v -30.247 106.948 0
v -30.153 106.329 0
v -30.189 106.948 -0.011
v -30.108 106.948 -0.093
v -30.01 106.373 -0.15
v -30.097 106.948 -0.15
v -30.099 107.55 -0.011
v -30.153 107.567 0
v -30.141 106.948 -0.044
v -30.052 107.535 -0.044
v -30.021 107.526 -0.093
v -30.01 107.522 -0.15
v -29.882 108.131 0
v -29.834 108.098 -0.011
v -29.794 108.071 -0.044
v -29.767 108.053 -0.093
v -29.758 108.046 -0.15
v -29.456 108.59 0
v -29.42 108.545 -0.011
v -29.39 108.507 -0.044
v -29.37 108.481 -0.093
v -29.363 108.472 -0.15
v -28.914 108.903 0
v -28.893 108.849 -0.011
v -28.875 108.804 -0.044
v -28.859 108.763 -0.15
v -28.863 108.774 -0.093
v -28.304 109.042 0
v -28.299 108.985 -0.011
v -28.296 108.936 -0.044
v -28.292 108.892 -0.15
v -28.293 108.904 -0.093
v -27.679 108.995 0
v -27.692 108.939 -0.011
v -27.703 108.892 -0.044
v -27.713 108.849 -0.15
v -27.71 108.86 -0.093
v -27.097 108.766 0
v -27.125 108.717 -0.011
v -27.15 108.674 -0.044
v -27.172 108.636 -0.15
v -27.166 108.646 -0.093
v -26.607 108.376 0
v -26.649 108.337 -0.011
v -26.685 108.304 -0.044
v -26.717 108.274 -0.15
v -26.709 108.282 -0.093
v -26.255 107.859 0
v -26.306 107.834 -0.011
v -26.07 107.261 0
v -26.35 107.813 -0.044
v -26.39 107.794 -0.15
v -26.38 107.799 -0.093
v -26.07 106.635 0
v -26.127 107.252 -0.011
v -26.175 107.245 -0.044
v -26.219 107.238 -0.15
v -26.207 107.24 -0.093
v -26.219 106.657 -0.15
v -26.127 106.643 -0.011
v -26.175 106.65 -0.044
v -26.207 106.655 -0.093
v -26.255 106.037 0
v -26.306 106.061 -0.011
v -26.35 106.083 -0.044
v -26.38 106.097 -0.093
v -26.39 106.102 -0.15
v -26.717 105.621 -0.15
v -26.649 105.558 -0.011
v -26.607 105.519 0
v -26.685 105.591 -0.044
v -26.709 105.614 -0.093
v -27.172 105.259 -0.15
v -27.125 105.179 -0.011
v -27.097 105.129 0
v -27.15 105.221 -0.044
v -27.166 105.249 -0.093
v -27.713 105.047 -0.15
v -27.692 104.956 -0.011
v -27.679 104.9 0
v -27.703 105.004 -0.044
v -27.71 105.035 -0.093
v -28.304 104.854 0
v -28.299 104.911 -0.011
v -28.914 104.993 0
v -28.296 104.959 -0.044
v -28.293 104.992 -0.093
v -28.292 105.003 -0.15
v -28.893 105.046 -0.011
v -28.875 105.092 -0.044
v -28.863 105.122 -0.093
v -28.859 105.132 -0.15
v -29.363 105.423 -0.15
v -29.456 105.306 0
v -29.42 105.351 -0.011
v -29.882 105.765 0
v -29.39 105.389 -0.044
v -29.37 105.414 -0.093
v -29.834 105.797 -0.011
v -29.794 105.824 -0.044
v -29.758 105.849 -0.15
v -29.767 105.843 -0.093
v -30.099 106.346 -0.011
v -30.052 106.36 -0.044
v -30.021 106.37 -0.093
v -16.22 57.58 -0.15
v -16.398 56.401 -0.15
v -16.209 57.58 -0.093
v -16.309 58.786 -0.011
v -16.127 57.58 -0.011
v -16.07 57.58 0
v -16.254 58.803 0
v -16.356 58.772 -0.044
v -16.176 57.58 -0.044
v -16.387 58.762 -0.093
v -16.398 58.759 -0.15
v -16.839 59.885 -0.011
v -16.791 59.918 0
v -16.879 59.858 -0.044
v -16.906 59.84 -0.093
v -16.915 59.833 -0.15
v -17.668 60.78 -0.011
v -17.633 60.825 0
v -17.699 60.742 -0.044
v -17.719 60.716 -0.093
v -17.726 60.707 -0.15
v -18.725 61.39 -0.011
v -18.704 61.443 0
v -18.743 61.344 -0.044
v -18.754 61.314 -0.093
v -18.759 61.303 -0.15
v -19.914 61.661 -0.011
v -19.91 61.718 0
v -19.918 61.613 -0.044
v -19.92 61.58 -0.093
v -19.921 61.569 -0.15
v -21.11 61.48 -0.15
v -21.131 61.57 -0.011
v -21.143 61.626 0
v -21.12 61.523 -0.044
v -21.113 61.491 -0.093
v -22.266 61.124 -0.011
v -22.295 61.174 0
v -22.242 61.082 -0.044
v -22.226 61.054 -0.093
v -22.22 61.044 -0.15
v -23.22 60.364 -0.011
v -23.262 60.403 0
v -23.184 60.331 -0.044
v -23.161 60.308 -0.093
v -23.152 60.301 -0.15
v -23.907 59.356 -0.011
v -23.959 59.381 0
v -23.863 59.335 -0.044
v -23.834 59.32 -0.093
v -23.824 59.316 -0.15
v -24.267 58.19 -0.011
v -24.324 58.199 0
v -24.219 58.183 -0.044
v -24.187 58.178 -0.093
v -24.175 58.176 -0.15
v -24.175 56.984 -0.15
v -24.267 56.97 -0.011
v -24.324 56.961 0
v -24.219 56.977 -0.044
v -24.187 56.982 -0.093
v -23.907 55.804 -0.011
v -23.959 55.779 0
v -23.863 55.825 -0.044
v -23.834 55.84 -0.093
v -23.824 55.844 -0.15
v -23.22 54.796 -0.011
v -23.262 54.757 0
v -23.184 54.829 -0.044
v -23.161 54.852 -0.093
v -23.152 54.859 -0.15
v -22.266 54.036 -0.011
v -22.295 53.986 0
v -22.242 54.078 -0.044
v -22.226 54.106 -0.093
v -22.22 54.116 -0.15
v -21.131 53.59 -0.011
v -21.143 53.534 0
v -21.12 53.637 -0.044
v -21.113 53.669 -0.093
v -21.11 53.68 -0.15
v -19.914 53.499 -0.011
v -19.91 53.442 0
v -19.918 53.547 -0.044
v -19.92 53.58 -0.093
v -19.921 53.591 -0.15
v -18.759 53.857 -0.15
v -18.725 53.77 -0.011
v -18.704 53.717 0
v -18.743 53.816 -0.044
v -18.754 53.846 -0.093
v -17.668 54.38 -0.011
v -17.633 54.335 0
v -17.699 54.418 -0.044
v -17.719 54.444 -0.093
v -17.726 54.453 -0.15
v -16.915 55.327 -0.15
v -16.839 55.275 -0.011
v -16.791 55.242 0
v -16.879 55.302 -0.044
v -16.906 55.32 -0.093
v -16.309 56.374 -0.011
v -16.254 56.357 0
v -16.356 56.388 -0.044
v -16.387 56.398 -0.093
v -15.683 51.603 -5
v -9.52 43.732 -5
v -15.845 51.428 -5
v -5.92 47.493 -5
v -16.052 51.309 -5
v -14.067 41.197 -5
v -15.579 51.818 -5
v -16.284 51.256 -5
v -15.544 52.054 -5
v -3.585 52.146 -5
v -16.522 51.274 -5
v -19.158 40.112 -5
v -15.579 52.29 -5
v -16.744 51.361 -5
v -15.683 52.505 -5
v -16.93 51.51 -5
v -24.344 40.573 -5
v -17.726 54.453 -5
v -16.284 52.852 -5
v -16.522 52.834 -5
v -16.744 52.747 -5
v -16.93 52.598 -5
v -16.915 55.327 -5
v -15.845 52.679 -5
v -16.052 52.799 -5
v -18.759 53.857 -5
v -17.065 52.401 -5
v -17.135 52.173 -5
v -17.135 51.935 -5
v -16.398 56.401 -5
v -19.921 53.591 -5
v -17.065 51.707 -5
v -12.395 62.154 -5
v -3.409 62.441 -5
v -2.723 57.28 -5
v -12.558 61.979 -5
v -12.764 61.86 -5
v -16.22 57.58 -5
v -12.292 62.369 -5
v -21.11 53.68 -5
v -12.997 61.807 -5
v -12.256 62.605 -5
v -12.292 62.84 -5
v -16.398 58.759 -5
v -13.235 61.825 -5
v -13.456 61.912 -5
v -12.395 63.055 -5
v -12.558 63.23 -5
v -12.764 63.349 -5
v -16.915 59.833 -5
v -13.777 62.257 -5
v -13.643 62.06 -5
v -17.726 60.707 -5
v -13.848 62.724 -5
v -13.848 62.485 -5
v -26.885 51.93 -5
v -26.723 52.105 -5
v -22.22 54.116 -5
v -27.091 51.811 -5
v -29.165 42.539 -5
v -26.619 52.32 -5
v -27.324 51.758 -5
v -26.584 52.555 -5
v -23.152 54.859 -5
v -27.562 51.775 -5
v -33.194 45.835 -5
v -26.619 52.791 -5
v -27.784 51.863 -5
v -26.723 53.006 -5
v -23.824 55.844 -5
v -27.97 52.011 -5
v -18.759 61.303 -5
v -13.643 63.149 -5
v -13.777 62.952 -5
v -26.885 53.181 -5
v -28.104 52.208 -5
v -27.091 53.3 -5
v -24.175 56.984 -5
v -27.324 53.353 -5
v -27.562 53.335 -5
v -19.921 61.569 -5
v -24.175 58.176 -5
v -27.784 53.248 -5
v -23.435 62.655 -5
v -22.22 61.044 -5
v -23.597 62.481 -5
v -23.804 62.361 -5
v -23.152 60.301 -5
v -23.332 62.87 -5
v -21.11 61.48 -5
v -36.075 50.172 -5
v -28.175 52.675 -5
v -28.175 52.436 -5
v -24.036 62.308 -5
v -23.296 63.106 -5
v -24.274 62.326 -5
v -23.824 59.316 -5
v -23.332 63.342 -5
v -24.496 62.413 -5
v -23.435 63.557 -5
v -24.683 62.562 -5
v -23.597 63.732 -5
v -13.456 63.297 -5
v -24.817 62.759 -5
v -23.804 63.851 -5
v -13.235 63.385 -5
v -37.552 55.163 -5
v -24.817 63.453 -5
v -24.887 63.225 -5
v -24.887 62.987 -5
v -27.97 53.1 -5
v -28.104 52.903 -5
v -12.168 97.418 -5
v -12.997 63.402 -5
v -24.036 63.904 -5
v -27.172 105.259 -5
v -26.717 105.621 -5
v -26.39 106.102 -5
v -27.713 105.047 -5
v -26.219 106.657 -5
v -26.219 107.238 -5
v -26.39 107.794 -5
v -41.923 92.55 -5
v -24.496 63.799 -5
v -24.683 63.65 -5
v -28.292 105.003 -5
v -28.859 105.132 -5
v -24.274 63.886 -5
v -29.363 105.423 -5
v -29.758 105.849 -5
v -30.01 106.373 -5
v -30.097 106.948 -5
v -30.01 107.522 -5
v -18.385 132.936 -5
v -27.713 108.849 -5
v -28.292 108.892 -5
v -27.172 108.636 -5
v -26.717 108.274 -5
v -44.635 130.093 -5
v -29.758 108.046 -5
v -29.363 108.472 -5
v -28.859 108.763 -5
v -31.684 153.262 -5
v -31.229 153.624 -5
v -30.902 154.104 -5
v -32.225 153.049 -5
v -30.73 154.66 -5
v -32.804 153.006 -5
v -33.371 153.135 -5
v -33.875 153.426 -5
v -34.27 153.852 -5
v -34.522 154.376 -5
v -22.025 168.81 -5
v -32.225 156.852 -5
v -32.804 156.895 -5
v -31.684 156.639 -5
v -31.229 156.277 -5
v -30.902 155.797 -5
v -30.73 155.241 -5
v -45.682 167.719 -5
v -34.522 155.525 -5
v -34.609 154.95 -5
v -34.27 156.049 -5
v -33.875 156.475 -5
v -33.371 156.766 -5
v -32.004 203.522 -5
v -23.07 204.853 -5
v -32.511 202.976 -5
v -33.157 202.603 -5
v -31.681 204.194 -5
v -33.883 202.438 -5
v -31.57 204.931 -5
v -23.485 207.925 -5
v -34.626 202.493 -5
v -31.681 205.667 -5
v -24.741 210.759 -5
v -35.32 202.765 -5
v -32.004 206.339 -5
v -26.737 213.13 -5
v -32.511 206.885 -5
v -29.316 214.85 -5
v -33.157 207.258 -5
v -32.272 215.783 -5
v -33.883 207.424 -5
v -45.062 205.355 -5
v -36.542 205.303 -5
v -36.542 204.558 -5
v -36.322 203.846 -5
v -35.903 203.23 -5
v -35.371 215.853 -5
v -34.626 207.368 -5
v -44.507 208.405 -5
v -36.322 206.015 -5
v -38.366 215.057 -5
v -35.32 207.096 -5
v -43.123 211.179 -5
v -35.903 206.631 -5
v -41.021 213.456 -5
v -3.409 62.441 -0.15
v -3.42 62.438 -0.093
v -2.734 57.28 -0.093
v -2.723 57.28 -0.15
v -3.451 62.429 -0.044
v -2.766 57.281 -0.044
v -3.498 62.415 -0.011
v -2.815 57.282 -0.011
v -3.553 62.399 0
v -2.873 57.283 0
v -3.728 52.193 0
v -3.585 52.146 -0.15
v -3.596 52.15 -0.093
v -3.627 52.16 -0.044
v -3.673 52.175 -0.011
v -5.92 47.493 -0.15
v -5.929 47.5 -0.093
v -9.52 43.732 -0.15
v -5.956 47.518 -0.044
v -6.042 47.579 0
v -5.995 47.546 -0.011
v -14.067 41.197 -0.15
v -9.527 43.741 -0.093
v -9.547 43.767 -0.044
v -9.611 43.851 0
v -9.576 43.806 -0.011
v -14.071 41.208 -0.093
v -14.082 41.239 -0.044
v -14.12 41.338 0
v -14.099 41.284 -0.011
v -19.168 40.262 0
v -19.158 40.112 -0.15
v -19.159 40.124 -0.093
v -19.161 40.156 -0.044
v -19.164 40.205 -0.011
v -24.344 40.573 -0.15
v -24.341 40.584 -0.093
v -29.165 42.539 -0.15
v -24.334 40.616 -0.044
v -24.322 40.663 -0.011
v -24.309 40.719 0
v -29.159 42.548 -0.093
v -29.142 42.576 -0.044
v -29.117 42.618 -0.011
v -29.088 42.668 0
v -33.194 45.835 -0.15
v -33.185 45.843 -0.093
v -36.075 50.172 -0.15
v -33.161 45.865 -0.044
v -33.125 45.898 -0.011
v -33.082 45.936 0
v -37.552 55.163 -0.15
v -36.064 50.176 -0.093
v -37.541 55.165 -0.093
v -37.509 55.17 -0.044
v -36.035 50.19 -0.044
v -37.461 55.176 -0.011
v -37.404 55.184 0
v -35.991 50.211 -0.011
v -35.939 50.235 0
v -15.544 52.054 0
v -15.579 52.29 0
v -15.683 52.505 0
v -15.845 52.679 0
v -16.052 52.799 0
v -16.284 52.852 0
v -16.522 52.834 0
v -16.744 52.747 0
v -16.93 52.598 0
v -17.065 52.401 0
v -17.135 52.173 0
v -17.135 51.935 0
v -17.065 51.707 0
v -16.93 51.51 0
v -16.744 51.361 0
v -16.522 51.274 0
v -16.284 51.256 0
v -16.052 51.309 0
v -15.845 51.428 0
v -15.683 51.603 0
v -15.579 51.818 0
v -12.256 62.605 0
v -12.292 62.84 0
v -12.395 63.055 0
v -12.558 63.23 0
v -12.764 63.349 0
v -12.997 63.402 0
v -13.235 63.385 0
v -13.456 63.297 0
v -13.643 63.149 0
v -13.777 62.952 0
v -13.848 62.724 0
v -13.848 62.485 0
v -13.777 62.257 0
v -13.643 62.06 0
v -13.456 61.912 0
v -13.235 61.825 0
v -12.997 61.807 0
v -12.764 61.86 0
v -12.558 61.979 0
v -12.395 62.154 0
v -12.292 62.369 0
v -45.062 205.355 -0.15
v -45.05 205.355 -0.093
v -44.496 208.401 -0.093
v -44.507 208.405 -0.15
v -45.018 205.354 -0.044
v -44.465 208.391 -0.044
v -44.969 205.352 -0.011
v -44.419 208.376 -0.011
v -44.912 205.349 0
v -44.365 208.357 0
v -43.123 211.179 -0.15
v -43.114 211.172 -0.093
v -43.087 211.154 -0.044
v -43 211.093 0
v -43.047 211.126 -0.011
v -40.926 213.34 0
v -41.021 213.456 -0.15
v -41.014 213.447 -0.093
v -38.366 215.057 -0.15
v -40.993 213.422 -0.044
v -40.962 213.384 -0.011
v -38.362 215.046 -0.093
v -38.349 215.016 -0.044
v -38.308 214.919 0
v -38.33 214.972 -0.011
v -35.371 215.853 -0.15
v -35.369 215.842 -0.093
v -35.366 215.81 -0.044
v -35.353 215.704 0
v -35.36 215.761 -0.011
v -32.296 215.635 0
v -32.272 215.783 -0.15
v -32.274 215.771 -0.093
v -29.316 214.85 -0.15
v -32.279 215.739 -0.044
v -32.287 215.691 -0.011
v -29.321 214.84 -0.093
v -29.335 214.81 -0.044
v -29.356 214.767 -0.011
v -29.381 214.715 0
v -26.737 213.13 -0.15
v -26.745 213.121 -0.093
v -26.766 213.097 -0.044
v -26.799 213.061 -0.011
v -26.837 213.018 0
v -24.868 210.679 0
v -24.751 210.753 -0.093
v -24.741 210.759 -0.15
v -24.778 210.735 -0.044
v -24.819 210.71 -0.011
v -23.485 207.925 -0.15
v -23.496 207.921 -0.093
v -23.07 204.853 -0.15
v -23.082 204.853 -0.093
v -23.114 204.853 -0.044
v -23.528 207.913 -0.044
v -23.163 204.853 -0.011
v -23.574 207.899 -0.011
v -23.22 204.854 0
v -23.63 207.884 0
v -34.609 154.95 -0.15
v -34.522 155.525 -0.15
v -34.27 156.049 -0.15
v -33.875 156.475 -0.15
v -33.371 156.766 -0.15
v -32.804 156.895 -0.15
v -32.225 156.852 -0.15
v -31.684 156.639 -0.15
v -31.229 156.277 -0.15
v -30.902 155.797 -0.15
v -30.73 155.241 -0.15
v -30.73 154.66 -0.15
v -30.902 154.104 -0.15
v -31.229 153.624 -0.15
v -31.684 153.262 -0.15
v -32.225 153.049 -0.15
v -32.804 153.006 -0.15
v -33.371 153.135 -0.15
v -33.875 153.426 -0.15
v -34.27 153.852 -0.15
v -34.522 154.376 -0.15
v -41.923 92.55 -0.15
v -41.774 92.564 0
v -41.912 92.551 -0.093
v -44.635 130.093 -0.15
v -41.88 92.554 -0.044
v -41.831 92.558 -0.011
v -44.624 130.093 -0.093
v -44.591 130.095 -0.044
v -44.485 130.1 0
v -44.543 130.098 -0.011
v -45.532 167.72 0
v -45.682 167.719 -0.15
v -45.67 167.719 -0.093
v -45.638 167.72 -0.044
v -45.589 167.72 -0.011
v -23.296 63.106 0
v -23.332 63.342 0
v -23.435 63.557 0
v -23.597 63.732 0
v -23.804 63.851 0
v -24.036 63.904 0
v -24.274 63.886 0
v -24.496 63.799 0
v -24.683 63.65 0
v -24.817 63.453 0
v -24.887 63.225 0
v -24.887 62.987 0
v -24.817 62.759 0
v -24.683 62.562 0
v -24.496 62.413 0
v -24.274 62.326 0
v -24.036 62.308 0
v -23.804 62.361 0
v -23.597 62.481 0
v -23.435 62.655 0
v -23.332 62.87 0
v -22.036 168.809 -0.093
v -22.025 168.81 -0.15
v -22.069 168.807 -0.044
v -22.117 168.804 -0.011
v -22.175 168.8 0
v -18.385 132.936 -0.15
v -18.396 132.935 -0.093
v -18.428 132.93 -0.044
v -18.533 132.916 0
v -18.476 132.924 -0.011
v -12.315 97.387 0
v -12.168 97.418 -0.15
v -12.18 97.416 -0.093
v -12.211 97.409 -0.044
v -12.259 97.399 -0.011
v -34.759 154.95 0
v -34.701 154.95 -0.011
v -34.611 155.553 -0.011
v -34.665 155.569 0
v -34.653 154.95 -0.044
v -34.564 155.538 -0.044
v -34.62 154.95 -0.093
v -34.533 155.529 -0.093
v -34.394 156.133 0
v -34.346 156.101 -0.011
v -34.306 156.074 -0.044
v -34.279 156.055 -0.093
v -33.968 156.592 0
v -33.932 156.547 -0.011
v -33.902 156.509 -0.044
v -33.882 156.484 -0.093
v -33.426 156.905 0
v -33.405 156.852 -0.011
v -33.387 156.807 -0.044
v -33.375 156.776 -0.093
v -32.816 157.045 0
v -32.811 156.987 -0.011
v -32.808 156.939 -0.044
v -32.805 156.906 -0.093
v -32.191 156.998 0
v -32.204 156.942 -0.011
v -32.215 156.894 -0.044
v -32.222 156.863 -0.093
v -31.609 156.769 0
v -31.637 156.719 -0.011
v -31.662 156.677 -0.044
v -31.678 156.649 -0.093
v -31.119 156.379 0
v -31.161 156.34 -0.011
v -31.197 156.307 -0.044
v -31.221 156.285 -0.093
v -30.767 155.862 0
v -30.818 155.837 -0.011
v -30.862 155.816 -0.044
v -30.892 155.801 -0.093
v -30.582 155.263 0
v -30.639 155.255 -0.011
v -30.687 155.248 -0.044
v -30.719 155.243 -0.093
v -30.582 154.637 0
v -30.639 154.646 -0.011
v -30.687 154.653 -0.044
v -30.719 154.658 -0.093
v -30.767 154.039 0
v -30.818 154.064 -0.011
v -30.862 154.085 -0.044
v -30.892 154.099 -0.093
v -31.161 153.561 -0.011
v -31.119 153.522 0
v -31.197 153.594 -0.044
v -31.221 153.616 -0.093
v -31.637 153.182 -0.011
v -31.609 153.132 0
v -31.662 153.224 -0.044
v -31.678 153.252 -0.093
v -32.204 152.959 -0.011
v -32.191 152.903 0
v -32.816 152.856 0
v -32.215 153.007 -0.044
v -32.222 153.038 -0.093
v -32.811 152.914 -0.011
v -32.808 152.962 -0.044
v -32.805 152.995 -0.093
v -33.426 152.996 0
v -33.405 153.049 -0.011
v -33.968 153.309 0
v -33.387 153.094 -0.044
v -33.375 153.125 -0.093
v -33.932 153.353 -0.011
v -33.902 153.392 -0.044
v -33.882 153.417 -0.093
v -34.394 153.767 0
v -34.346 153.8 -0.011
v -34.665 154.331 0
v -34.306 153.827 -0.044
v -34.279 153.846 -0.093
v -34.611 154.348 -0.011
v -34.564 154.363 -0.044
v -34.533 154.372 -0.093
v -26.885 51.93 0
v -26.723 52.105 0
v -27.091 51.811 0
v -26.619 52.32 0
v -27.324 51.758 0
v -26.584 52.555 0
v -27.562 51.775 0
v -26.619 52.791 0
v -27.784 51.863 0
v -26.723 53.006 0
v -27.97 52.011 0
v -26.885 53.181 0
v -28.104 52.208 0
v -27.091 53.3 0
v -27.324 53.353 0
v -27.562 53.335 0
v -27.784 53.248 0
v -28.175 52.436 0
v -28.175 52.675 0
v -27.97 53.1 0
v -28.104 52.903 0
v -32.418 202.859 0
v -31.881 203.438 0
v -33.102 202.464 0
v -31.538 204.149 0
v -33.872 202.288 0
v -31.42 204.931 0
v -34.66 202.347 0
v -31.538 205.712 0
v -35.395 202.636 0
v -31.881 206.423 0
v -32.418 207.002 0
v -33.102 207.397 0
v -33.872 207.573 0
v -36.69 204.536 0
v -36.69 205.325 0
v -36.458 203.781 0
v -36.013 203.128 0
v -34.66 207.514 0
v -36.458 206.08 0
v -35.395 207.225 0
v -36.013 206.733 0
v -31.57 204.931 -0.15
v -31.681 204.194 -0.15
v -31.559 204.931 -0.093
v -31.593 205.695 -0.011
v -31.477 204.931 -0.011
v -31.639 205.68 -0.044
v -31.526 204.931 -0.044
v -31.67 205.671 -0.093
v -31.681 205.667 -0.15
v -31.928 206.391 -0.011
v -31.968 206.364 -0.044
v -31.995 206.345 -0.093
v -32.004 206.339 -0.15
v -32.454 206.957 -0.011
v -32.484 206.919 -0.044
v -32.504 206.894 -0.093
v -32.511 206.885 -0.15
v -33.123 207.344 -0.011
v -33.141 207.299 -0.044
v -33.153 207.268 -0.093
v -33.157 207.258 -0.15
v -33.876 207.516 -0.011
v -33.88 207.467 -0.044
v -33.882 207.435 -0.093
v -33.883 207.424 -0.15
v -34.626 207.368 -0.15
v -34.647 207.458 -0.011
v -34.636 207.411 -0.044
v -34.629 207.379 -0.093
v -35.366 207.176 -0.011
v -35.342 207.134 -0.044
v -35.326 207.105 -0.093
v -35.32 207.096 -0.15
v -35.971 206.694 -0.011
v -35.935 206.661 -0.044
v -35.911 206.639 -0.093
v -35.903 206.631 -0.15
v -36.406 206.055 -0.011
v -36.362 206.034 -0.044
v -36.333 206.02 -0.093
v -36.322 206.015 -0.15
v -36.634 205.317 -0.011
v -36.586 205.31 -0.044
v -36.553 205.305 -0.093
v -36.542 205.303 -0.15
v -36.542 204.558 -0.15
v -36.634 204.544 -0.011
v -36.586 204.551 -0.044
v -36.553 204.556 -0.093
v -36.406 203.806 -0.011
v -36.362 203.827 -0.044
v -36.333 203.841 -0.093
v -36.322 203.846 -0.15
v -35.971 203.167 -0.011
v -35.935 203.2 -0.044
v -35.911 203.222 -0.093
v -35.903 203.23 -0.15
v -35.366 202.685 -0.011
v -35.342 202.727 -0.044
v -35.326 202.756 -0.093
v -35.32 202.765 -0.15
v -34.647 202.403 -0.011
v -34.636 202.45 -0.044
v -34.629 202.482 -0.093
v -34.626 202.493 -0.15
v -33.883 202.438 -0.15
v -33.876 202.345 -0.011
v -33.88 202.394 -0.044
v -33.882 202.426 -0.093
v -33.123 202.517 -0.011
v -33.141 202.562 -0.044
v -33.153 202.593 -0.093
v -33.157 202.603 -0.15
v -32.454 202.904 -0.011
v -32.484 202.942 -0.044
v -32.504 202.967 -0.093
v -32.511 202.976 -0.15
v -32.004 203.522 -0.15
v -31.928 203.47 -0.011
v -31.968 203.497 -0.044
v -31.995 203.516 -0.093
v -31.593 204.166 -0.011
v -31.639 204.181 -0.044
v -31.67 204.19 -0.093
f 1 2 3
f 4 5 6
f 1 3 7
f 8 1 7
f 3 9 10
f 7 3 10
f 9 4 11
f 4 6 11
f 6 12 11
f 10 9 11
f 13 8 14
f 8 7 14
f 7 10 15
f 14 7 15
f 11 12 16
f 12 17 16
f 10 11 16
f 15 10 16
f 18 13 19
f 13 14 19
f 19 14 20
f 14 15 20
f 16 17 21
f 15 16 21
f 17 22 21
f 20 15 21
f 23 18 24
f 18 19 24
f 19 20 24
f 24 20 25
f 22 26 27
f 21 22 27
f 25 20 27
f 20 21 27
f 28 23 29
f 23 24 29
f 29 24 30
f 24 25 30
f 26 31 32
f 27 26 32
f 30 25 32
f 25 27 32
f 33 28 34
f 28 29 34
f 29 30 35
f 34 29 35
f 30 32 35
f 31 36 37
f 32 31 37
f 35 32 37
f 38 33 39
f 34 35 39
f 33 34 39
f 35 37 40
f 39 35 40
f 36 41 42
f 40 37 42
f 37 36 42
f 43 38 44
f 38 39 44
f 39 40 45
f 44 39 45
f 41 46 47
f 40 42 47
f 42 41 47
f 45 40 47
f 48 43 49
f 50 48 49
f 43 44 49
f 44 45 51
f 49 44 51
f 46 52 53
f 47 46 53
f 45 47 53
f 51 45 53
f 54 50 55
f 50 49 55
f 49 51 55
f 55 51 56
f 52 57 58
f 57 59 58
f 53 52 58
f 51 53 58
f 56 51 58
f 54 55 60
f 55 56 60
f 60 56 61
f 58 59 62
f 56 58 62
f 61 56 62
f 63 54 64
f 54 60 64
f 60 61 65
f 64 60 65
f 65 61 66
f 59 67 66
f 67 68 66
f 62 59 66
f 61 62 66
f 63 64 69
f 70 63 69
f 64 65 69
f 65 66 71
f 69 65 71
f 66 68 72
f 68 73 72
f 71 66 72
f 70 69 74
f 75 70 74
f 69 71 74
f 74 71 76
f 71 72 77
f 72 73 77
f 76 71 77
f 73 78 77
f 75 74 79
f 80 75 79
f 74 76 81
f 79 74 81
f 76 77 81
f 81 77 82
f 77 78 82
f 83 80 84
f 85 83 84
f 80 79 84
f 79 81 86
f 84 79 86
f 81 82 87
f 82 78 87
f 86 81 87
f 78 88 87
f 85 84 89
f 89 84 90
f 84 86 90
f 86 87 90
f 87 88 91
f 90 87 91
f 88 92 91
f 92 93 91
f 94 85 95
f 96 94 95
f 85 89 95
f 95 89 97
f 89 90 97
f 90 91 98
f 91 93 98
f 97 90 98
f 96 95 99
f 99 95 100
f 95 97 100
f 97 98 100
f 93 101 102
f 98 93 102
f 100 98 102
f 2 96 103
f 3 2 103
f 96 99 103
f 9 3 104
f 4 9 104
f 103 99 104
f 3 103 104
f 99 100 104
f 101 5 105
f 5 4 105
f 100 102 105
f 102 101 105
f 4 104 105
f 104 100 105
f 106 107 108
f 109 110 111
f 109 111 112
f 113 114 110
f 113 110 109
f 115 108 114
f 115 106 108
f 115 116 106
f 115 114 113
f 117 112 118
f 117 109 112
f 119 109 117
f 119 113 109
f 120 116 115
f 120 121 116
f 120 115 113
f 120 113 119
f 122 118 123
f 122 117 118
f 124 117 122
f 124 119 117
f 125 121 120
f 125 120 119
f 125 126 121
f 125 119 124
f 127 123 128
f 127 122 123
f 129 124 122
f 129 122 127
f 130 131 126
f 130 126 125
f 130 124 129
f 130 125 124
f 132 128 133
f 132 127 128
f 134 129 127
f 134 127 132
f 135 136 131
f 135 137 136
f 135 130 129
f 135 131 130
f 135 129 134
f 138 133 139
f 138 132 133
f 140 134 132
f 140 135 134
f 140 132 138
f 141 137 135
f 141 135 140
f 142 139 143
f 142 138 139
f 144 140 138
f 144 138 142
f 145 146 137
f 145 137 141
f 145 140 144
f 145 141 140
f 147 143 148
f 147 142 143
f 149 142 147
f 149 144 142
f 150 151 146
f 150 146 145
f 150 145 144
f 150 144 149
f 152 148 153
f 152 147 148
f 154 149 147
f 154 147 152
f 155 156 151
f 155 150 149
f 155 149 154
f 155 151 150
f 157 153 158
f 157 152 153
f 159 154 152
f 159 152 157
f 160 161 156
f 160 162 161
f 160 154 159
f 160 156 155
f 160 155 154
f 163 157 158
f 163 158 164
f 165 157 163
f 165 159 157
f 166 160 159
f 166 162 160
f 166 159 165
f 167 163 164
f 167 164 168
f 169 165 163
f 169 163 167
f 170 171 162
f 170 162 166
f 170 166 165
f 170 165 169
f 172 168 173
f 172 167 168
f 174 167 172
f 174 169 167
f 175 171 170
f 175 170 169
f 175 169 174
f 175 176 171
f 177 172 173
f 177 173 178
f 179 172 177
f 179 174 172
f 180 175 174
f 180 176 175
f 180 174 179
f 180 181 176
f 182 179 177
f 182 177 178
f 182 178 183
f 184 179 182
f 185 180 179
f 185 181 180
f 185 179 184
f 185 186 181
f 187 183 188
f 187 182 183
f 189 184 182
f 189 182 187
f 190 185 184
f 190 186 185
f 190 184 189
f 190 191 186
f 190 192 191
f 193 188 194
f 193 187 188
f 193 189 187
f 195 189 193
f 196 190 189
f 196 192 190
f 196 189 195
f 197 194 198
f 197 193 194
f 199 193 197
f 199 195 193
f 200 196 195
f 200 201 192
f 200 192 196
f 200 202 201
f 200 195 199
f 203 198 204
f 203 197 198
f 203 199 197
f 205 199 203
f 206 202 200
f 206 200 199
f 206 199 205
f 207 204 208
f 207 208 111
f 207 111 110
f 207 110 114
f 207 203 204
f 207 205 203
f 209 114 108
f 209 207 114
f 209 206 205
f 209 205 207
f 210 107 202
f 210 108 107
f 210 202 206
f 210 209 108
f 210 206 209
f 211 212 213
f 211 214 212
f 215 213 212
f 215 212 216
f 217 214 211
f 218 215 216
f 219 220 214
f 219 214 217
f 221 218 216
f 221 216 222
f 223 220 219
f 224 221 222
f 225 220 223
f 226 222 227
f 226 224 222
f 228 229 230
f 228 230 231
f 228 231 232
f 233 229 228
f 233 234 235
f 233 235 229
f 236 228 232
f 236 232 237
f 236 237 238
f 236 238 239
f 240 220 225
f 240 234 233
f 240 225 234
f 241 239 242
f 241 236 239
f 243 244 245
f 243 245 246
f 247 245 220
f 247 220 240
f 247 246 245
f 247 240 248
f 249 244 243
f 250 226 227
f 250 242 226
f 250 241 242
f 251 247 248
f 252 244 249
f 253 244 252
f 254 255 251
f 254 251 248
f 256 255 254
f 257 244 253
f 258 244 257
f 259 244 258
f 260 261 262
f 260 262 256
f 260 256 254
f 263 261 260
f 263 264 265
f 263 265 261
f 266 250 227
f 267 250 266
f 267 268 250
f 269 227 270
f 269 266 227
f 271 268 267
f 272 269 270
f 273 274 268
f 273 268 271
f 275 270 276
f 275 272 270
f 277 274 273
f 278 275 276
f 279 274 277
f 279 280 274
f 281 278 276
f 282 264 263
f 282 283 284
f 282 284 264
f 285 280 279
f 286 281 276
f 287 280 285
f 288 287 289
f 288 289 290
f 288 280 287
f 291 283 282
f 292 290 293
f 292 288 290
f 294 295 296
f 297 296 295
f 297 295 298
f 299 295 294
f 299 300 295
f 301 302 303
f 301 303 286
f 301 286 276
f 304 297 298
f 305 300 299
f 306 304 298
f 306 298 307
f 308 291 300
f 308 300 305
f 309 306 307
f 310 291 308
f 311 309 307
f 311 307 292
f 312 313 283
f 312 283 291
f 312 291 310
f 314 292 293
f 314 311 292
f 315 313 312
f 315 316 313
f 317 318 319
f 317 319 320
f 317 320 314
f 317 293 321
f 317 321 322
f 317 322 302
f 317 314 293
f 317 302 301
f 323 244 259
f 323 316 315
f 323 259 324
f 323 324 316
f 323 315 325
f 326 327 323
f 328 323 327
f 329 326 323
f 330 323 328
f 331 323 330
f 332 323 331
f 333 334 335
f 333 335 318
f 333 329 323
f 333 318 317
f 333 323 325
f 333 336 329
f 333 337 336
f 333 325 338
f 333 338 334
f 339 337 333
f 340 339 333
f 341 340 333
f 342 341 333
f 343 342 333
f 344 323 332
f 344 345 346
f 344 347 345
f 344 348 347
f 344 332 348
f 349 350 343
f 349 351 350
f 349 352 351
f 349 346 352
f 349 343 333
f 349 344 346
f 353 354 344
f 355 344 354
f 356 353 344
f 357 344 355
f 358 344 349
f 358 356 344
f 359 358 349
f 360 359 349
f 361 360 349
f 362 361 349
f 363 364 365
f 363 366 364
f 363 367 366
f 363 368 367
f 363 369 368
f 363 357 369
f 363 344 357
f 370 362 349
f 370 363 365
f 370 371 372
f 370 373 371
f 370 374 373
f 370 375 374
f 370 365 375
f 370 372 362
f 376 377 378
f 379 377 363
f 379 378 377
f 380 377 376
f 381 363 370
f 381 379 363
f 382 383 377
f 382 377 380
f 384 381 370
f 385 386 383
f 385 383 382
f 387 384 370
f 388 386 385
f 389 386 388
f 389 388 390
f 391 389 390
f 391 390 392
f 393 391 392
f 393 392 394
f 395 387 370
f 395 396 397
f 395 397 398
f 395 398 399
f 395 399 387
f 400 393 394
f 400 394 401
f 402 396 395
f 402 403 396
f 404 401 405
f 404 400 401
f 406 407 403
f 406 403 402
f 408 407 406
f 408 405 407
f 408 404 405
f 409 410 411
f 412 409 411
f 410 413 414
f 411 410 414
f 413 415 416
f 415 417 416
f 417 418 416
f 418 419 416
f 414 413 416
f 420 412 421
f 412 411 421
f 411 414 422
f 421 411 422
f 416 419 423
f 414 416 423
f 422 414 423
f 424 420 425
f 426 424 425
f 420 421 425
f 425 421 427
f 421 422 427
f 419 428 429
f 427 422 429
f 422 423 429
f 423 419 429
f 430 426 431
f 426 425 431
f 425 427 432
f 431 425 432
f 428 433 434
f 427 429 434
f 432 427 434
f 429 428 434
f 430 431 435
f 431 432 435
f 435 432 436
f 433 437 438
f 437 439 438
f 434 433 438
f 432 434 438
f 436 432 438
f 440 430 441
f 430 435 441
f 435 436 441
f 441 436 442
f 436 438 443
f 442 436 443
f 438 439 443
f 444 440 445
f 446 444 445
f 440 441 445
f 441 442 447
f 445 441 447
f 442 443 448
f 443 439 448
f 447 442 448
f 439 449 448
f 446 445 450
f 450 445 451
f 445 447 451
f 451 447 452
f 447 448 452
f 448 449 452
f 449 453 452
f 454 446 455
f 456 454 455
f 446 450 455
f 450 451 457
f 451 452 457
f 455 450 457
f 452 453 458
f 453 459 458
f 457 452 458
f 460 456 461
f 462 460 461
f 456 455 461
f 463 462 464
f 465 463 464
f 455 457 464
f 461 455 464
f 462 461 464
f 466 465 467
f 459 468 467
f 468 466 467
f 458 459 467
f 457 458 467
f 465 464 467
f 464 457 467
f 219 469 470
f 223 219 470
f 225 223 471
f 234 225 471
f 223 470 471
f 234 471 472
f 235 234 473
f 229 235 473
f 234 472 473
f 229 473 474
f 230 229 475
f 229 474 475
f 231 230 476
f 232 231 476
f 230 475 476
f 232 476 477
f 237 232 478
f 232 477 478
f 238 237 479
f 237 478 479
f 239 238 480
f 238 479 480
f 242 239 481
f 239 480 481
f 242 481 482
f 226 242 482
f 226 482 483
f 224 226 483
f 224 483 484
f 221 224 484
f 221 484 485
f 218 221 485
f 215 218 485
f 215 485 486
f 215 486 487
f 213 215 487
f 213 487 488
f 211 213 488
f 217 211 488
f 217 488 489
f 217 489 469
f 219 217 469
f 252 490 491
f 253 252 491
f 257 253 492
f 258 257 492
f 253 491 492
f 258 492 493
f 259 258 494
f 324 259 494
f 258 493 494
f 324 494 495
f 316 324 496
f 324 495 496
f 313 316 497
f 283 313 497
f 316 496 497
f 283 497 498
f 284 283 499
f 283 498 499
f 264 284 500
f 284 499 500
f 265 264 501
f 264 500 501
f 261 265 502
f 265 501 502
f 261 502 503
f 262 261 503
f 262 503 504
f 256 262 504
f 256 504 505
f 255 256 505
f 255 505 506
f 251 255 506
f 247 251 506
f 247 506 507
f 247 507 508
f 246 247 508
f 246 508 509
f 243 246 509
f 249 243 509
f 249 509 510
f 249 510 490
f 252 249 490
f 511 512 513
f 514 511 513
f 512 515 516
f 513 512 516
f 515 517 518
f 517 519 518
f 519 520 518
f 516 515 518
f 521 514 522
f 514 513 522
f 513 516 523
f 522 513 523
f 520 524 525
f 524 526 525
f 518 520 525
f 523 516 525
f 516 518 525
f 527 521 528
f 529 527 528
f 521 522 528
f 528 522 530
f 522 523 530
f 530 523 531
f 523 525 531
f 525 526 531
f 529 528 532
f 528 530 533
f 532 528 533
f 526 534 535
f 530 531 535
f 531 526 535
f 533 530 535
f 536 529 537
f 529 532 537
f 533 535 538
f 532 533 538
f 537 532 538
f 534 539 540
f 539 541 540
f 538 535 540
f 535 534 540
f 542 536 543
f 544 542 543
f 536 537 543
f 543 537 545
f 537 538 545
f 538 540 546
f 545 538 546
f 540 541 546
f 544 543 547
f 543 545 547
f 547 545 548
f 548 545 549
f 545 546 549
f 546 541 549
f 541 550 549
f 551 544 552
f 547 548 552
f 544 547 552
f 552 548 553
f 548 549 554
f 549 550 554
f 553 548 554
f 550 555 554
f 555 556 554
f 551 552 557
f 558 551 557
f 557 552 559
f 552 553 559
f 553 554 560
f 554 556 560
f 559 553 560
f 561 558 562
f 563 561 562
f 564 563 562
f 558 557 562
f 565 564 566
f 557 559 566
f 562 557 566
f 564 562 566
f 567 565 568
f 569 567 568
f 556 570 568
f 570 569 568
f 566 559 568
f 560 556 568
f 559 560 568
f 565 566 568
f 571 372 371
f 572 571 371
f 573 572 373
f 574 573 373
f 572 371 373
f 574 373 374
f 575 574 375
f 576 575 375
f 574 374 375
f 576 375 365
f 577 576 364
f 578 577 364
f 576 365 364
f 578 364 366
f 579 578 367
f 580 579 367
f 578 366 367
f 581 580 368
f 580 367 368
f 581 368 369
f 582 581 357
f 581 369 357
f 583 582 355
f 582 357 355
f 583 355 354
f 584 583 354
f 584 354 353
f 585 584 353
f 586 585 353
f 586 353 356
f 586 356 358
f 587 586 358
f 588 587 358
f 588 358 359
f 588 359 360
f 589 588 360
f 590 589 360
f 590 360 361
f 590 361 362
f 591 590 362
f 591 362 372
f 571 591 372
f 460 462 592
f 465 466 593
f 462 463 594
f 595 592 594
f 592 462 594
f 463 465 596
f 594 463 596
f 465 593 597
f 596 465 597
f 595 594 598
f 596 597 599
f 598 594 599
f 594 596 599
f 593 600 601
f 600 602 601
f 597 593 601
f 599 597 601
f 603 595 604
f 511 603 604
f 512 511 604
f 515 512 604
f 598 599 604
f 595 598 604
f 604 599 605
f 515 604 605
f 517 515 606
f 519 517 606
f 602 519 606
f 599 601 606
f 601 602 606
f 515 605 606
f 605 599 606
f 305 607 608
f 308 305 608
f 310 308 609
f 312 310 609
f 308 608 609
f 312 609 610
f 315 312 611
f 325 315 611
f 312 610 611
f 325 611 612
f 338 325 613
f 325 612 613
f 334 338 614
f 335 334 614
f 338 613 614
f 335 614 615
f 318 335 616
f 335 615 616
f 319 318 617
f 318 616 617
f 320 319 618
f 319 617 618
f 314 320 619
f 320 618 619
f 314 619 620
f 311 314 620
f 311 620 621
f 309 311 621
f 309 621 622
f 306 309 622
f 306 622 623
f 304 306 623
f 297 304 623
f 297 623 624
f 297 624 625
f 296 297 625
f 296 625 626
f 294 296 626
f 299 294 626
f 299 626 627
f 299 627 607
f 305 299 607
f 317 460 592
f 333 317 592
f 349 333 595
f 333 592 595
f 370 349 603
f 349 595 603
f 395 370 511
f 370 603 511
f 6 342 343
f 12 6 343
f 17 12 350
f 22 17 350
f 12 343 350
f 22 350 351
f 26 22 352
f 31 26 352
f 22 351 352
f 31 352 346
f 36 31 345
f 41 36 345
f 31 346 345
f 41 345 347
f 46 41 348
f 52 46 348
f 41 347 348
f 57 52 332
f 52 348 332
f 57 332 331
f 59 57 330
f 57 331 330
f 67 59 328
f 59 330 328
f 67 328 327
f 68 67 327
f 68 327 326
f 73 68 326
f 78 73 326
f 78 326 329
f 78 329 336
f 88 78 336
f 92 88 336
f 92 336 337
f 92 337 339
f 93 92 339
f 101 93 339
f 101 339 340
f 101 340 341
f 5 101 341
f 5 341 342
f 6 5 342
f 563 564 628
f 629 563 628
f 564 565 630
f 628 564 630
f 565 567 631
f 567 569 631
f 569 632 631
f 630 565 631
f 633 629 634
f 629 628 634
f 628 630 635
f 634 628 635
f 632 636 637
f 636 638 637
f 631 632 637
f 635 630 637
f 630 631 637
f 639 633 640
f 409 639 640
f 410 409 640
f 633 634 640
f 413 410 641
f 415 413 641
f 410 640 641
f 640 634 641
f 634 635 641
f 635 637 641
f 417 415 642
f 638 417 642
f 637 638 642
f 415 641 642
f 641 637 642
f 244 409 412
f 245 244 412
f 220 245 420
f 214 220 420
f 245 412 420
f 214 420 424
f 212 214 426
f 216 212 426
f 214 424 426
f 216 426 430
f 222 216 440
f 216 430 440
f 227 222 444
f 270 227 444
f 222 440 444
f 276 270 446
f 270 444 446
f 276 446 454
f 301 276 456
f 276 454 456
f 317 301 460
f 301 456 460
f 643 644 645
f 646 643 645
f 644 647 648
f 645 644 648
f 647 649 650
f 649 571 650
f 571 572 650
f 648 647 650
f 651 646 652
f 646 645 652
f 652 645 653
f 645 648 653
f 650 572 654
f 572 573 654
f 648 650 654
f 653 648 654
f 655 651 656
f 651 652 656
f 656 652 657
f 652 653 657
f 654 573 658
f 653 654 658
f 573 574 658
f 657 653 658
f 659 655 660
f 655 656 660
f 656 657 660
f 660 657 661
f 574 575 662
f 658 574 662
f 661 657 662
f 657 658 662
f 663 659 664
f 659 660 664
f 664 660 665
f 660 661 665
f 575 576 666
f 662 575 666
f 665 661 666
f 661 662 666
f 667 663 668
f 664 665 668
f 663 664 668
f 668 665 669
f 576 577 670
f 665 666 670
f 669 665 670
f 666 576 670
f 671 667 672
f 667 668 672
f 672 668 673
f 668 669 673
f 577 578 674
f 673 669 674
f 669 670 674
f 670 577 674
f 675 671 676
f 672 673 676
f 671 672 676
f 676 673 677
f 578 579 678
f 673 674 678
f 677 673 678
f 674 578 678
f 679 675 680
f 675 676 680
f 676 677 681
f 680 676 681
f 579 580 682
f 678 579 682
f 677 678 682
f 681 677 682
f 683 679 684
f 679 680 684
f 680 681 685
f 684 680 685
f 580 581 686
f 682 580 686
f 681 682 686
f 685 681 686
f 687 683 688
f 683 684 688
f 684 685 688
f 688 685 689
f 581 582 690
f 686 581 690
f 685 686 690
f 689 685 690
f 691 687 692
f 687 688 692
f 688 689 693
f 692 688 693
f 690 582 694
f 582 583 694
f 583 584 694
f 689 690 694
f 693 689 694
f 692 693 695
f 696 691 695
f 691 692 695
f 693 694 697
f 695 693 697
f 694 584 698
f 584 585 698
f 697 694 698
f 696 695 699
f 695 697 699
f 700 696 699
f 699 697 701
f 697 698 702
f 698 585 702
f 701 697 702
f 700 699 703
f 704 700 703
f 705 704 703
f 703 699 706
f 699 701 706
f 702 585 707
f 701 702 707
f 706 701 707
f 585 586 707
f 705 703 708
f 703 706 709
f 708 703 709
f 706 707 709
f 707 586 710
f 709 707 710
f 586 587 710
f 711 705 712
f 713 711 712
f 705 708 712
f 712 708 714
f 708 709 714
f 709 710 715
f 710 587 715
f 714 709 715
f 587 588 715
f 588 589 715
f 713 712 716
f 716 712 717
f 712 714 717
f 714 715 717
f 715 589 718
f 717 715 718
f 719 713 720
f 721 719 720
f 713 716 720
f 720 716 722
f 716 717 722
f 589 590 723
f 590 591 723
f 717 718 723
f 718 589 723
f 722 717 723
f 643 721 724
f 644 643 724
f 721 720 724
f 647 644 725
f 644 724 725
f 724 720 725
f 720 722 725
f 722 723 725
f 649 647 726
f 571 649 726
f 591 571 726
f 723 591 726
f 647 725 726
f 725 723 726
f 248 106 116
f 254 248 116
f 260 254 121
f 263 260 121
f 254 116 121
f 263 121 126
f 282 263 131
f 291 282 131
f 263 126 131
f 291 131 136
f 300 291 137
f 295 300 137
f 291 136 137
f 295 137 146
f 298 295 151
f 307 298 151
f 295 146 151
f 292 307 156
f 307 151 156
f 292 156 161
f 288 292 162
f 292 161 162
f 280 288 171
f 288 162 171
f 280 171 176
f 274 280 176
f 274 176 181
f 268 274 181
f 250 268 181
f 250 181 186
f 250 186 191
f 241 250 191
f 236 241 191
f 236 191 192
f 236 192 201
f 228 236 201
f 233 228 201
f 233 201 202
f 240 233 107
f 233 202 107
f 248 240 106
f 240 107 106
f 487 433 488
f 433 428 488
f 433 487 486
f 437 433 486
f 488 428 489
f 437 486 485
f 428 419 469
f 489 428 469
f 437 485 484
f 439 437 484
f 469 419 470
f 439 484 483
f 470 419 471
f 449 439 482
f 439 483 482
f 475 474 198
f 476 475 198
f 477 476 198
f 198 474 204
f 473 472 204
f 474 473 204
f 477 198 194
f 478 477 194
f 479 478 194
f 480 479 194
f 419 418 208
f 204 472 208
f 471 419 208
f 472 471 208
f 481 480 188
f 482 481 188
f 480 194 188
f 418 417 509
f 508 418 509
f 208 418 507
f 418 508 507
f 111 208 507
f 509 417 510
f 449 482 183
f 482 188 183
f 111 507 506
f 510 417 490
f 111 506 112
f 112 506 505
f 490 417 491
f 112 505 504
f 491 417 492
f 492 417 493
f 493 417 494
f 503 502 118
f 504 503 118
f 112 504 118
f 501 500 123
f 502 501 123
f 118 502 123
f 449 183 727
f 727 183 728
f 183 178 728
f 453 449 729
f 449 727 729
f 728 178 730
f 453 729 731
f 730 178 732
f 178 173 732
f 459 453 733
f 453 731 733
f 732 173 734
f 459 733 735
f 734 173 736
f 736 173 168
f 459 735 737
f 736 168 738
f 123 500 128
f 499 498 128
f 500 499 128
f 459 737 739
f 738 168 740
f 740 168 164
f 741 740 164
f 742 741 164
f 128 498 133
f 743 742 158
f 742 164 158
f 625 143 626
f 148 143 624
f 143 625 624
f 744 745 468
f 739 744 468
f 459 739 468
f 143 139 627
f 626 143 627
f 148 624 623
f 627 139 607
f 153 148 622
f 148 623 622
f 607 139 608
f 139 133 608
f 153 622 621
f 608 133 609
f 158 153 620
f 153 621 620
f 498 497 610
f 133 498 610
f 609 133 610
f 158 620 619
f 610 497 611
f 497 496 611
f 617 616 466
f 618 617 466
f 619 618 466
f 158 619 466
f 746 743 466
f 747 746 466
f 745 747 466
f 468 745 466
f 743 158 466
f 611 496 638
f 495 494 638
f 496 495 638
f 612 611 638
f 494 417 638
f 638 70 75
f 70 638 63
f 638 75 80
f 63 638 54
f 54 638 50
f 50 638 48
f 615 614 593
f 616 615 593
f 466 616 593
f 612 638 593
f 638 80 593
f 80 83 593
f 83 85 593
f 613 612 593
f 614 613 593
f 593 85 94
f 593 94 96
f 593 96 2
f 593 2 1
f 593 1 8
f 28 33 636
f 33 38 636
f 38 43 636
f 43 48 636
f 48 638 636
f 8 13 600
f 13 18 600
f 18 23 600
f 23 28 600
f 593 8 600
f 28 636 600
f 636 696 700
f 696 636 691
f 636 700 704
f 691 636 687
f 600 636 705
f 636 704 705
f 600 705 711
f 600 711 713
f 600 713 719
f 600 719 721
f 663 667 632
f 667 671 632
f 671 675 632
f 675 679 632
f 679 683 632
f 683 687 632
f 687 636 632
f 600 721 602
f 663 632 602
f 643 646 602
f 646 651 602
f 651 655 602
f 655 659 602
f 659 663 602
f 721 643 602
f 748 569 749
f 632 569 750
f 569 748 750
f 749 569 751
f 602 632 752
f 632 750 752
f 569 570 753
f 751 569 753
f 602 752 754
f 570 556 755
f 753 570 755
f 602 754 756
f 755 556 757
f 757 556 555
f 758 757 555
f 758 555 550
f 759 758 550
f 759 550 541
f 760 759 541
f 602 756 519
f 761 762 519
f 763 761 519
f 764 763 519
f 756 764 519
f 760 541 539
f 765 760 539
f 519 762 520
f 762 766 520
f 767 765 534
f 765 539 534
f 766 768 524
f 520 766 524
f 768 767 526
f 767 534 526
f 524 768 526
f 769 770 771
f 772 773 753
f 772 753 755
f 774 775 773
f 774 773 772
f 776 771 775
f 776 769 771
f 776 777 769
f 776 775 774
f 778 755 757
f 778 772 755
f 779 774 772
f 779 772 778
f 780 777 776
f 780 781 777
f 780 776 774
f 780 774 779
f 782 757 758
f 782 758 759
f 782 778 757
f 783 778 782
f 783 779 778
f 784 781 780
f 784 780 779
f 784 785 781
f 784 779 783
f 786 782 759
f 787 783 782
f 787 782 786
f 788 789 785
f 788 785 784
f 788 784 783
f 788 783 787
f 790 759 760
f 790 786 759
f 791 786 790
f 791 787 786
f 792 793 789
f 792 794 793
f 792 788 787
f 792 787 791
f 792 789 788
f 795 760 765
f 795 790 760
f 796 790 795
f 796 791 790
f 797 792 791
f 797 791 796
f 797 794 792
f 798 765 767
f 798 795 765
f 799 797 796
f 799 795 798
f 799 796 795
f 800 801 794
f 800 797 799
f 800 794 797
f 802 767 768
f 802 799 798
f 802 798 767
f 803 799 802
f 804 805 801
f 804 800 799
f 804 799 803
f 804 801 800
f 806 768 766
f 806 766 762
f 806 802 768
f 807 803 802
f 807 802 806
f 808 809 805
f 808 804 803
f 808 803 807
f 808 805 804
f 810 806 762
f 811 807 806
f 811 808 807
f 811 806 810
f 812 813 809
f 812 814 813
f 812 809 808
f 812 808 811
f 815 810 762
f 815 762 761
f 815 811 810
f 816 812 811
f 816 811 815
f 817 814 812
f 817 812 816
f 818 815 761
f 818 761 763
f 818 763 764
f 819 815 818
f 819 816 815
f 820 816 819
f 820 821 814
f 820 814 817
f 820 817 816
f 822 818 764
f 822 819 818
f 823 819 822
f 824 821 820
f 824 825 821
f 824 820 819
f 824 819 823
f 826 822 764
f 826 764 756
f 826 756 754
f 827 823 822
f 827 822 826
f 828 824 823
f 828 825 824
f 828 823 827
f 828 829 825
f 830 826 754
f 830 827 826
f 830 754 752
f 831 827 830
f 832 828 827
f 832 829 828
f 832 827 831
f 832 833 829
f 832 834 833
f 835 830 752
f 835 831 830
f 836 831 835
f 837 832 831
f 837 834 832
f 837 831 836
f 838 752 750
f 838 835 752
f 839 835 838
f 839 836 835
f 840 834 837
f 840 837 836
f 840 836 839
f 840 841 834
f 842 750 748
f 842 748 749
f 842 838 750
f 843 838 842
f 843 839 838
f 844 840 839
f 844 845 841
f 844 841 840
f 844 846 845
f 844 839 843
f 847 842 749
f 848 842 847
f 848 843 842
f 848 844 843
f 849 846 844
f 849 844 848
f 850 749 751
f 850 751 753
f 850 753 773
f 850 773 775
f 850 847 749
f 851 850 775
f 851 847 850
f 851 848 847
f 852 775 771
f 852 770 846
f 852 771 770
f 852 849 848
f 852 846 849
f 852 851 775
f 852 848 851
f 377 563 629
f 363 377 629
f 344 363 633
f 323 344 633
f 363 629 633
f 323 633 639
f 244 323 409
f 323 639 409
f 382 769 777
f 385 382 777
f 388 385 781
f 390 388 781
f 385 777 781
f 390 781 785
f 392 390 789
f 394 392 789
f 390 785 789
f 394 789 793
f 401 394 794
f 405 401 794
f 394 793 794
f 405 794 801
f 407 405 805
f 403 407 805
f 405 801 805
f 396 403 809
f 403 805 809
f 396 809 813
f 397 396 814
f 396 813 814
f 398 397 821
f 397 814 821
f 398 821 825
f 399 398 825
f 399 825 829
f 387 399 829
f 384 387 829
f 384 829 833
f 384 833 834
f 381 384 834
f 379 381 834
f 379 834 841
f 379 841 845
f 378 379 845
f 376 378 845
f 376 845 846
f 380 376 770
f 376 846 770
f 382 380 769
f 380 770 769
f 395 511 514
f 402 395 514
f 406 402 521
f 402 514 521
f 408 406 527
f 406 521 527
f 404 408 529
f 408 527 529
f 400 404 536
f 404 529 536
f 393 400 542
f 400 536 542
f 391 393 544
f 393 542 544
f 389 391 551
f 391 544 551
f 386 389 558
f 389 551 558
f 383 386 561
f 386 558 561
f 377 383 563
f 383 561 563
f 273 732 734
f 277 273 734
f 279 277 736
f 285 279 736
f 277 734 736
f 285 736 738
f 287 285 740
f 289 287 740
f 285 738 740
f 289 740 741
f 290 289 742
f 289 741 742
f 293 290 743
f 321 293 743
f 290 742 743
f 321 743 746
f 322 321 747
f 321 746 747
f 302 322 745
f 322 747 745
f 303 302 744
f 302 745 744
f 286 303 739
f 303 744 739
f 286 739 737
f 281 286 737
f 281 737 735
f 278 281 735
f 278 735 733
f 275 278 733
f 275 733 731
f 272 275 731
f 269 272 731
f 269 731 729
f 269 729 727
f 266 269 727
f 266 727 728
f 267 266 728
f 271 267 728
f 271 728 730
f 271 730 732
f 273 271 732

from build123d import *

# Parameters (mm, degrees)
SKETCH2_R                  = 2.5
SKETCH2_R_2                = 4
BOSS_EXTRUDE1_DEPTH        = 5
M3_5_CLEARANCE_HOLE1_D     = 3.9
M3_5_CLEARANCE_HOLE1_DEPTH = 10
M3_5_CLEARANCE_HOLE1_TIP   = 1.171678207
FILLET1_R                  = 0.15
SKETCH8_R                  = 0.8
CUT_EXTRUDE1_DEPTH         = 221.769273329


with BuildPart() as part:
    # Sketch2 → Boss-Extrude1 (new body)
    with BuildSketch(Plane.XY):
        with BuildLine():
            ThreePointArc((-23.070308625, 204.852776014), (-18.384568366, 132.936409066), (-3.408597018, 62.440733462))
            ThreePointArc((-3.408597018, 62.440733462), (-16.572041078, 40.464439954), (-37.552346237, 55.163437582))
            ThreePointArc((-37.552346237, 55.163437582), (-44.635045584, 130.092922622), (-45.061833099, 205.355198769))
            ThreePointArc((-45.061833099, 205.355198769), (-33.818791234, 215.927653179), (-23.070308625, 204.852776014))
        make_face()
        with Locations((-34.070033869, 204.930522774)):
            Circle(SKETCH2_R, mode=Mode.SUBTRACT)
        with Locations((-20.22, 57.58)):
            Circle(SKETCH2_R_2, mode=Mode.SUBTRACT)
    extrude(amount=-BOSS_EXTRUDE1_DEPTH)

    # M3.5 Clearance Hole1
    with Locations(Plane.XY):
        with Locations((-32.658696908, 154.950445464), (-28.146734226, 106.947670438)):
            Hole(M3_5_CLEARANCE_HOLE1_D / 2, depth=M3_5_CLEARANCE_HOLE1_DEPTH)
            with Locations((0, 0, -(M3_5_CLEARANCE_HOLE1_DEPTH + M3_5_CLEARANCE_HOLE1_TIP / 2))):  # 118° drill point
                Cone(0, M3_5_CLEARANCE_HOLE1_D / 2, M3_5_CLEARANCE_HOLE1_TIP, mode=Mode.SUBTRACT)

    # Fillet1
    fillet1_edges = [part.edges().sort_by_distance(p)[0] for p in [
        (-36.570033869, 204.930522774, 0),
        (-24.22, 57.58, 0),
        (-26.196734226, 106.947670438, 0),
        (-30.708696908, 154.950445464, 0),
        (-18.384568366, 132.936409066, 0),
        (-16.572041078, 40.464439954, 0),
        (-44.635045584, 130.092922622, 0),
        (-33.818791234, 215.927653179, 0),
    ]]
    fillet(fillet1_edges, radius=FILLET1_R)

    # Sketch8 → Cut-Extrude1 (cut, through all)
    with BuildSketch(Plane.XY):
        with Locations((-27.383509966, 52.555398028)):
            Circle(SKETCH8_R)
        with Locations((-16.343878479, 52.053863741)):
            Circle(SKETCH8_R)
        with Locations((-13.056490034, 62.604601972)):
            Circle(SKETCH8_R)
        with Locations((-24.096121521, 63.106136259)):
            Circle(SKETCH8_R)
    extrude(amount=-CUT_EXTRUDE1_DEPTH, mode=Mode.SUBTRACT)


solid = part.part
